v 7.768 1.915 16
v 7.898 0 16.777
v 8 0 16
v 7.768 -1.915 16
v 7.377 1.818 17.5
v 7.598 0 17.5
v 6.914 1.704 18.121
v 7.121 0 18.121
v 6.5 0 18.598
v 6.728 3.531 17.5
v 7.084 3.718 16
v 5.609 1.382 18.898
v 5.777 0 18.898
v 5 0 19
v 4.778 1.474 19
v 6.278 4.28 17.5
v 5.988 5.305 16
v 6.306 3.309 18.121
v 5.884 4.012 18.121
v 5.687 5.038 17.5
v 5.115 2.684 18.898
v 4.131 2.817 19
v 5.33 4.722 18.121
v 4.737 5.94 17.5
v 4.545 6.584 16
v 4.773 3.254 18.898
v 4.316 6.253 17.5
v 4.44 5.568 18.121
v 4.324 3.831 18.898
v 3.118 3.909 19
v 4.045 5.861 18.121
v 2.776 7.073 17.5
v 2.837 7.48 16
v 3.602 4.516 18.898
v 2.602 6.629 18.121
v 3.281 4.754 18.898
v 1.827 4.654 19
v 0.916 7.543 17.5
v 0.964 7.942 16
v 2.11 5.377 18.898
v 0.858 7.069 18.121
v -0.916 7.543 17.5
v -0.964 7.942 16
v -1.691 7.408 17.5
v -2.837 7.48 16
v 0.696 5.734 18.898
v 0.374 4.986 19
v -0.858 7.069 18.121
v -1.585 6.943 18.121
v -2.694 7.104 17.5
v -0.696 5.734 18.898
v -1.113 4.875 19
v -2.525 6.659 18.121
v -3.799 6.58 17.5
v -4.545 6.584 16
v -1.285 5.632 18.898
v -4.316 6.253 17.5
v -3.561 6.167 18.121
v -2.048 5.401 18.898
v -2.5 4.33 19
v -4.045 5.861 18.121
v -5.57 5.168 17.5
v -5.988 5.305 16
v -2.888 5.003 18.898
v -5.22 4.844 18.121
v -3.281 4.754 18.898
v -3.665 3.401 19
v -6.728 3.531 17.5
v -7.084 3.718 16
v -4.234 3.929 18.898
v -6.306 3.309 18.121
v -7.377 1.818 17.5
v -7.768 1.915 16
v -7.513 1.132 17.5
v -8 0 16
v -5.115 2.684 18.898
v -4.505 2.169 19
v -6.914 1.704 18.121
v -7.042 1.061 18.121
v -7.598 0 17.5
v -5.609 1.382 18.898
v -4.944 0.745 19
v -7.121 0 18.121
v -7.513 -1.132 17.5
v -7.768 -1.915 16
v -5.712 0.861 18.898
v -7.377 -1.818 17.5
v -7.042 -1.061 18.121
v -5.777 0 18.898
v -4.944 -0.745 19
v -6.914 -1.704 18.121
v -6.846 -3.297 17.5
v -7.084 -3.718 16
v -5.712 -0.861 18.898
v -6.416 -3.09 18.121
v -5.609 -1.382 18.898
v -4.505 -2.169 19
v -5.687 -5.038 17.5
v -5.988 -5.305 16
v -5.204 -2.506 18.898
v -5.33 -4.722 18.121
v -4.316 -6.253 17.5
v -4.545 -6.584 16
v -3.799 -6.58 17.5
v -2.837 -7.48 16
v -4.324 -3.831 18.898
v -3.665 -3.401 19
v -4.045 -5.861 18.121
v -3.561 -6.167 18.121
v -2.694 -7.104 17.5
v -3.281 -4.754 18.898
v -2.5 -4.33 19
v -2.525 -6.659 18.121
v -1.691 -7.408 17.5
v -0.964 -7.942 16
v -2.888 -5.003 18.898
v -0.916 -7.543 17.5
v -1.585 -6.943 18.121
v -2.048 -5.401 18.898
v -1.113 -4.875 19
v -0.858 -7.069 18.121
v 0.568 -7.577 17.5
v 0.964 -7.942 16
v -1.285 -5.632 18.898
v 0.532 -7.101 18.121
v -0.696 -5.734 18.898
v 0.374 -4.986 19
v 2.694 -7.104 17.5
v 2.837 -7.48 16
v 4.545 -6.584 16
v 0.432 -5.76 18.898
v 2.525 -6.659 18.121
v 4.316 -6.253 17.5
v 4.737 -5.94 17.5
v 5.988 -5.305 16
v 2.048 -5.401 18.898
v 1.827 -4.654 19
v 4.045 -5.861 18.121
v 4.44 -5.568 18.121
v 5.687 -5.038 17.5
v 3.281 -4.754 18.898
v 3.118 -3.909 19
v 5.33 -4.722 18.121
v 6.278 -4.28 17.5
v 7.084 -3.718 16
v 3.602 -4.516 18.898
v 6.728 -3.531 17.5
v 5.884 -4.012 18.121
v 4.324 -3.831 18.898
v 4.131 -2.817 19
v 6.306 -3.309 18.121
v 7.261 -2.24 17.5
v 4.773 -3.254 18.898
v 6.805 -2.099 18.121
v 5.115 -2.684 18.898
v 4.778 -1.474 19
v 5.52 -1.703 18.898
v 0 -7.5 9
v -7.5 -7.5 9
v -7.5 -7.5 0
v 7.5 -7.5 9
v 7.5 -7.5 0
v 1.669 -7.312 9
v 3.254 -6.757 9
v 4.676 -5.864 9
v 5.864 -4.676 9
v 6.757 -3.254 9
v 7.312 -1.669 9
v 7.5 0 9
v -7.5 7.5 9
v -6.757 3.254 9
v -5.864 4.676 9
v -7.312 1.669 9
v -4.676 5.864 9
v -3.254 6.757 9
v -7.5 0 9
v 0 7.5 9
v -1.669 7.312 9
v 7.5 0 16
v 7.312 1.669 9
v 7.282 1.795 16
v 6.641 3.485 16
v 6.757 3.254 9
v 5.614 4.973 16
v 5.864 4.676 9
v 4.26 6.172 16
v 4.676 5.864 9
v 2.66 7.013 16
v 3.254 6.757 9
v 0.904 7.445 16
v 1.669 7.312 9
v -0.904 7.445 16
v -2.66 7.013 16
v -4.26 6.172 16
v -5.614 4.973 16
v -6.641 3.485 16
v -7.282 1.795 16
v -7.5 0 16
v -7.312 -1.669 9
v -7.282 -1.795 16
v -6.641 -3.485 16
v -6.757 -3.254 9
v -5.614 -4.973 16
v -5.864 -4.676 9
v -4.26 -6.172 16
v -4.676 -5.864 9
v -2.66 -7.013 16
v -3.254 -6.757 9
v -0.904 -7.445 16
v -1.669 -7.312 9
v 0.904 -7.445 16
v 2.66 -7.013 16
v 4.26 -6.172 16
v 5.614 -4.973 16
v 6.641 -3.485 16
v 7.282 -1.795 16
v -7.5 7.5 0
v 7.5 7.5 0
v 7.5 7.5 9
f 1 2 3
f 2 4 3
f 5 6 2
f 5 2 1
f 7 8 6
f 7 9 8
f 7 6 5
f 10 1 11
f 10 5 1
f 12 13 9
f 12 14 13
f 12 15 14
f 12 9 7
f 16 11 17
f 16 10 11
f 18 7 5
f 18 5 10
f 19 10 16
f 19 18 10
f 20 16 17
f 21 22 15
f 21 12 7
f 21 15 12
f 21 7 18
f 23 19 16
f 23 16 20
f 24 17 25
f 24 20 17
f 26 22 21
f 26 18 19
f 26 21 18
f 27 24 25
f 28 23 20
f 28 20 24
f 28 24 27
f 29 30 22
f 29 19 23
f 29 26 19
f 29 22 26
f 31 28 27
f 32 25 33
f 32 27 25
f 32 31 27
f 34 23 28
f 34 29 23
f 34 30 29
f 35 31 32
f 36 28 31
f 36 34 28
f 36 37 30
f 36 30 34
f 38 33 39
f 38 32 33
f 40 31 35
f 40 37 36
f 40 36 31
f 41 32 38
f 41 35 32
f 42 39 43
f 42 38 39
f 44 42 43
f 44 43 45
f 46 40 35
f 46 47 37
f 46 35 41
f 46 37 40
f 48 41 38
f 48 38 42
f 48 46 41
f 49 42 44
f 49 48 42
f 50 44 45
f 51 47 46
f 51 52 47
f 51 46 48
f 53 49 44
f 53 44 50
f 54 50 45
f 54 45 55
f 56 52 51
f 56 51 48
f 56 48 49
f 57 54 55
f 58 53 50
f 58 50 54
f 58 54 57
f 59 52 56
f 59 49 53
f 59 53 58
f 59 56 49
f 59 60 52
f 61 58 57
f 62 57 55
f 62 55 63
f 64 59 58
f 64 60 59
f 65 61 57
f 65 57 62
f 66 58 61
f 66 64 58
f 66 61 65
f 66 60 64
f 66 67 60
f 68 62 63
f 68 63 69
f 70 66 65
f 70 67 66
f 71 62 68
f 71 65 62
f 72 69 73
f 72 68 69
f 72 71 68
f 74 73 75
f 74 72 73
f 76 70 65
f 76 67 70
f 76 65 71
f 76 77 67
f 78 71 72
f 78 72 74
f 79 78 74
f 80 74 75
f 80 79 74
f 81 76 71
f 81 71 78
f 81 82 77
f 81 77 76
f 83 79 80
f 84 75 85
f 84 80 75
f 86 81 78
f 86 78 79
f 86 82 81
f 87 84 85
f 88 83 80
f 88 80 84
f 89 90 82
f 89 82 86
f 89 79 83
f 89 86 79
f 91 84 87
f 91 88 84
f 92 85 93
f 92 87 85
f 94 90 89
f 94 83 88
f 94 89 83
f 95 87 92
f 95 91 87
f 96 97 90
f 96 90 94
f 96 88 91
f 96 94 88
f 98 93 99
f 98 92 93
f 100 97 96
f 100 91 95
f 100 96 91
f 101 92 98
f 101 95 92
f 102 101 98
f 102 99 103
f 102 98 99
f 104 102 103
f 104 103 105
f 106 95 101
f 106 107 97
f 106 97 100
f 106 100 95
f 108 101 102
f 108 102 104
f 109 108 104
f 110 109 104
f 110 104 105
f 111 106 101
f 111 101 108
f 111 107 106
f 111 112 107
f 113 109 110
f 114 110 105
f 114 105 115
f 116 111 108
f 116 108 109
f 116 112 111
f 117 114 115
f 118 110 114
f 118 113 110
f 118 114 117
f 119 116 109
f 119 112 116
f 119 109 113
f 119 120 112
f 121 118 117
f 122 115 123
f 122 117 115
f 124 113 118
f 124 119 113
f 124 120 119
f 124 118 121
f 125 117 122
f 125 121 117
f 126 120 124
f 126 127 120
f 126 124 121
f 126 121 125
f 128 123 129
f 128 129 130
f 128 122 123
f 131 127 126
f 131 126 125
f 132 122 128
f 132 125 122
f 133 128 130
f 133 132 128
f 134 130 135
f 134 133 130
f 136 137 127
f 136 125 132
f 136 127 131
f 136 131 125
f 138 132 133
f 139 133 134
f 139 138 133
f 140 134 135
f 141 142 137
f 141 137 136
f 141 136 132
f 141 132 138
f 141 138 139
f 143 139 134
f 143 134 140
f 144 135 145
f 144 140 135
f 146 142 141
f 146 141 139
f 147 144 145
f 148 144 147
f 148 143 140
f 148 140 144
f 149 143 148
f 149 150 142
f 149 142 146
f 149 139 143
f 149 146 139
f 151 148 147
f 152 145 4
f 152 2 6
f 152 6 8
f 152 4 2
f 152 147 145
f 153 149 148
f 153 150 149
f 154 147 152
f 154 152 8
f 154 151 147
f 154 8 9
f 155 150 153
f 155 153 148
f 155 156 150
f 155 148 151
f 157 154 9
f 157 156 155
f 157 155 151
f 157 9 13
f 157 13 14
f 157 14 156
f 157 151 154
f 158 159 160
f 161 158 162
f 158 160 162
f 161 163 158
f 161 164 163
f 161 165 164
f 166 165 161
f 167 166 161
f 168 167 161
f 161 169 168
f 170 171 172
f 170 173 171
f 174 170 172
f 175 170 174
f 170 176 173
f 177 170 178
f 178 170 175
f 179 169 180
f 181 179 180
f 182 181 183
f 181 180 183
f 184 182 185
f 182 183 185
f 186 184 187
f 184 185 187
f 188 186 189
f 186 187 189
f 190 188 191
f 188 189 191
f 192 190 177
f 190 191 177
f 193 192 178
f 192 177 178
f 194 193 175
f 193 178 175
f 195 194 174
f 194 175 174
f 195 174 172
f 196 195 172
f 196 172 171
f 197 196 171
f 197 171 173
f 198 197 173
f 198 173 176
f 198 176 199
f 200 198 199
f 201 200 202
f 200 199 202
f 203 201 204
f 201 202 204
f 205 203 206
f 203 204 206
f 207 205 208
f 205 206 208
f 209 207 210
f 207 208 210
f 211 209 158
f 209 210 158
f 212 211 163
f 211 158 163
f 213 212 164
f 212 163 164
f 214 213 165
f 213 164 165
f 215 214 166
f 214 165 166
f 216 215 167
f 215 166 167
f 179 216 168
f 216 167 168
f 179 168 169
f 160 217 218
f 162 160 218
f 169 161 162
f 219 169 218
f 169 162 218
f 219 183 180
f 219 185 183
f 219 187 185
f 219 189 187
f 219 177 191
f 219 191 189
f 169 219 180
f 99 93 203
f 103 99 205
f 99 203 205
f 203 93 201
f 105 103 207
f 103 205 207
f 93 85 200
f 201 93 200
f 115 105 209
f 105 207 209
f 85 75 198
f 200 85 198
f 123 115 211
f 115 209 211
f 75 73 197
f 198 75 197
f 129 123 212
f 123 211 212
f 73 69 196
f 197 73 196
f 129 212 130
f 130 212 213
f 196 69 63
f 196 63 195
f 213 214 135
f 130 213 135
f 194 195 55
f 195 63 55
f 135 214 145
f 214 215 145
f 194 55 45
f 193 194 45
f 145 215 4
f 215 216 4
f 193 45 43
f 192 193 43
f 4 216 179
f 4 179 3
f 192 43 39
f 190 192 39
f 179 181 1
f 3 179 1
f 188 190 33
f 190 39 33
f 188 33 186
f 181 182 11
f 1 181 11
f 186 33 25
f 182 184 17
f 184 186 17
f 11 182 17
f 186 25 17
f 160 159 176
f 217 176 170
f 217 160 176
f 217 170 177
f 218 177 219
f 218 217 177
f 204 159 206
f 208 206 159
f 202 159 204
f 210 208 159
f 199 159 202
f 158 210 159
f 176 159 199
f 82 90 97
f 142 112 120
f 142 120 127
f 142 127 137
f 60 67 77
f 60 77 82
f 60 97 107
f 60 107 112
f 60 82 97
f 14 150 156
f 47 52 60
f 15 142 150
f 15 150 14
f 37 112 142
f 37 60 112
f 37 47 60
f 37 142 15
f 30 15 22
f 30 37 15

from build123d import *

# Parameters (mm, degrees)
SKETCH_1_W      = 15
SKETCH_1_H      = 15
EXTRUDE_1_DEPTH = 9
SKETCH_5_R      = 7.5
EXTRUDE_2_DEPTH = 7
SKETCH_6_R      = 8
EXTRUDE_3_DEPTH = 3
FILLET_1_R      = 3


with BuildPart() as part:
    # 草图1 → 凸台-拉伸1 (new body)
    with BuildSketch(Plane.XY):
        Rectangle(SKETCH_1_W, SKETCH_1_H)
    extrude(amount=EXTRUDE_1_DEPTH)

    # 草图5 → 凸台-拉伸2 (add)
    with BuildSketch(Plane.XY.offset(9)):
        Circle(SKETCH_5_R)
    extrude(amount=EXTRUDE_2_DEPTH)

    # 草图6 → 凸台-拉伸3 (add)
    with BuildSketch(Plane.XY.offset(16)):
        Circle(SKETCH_6_R)
    extrude(amount=EXTRUDE_3_DEPTH)

    # 圆角1
    fillet_1_edges = [part.edges().sort_by_distance(p)[0] for p in [
        (-8, 0, 19),
    ]]
    fillet(fillet_1_edges, radius=FILLET_1_R - 0.0001)  # a hair under: the kernel refuses the full size


solid = part.part
